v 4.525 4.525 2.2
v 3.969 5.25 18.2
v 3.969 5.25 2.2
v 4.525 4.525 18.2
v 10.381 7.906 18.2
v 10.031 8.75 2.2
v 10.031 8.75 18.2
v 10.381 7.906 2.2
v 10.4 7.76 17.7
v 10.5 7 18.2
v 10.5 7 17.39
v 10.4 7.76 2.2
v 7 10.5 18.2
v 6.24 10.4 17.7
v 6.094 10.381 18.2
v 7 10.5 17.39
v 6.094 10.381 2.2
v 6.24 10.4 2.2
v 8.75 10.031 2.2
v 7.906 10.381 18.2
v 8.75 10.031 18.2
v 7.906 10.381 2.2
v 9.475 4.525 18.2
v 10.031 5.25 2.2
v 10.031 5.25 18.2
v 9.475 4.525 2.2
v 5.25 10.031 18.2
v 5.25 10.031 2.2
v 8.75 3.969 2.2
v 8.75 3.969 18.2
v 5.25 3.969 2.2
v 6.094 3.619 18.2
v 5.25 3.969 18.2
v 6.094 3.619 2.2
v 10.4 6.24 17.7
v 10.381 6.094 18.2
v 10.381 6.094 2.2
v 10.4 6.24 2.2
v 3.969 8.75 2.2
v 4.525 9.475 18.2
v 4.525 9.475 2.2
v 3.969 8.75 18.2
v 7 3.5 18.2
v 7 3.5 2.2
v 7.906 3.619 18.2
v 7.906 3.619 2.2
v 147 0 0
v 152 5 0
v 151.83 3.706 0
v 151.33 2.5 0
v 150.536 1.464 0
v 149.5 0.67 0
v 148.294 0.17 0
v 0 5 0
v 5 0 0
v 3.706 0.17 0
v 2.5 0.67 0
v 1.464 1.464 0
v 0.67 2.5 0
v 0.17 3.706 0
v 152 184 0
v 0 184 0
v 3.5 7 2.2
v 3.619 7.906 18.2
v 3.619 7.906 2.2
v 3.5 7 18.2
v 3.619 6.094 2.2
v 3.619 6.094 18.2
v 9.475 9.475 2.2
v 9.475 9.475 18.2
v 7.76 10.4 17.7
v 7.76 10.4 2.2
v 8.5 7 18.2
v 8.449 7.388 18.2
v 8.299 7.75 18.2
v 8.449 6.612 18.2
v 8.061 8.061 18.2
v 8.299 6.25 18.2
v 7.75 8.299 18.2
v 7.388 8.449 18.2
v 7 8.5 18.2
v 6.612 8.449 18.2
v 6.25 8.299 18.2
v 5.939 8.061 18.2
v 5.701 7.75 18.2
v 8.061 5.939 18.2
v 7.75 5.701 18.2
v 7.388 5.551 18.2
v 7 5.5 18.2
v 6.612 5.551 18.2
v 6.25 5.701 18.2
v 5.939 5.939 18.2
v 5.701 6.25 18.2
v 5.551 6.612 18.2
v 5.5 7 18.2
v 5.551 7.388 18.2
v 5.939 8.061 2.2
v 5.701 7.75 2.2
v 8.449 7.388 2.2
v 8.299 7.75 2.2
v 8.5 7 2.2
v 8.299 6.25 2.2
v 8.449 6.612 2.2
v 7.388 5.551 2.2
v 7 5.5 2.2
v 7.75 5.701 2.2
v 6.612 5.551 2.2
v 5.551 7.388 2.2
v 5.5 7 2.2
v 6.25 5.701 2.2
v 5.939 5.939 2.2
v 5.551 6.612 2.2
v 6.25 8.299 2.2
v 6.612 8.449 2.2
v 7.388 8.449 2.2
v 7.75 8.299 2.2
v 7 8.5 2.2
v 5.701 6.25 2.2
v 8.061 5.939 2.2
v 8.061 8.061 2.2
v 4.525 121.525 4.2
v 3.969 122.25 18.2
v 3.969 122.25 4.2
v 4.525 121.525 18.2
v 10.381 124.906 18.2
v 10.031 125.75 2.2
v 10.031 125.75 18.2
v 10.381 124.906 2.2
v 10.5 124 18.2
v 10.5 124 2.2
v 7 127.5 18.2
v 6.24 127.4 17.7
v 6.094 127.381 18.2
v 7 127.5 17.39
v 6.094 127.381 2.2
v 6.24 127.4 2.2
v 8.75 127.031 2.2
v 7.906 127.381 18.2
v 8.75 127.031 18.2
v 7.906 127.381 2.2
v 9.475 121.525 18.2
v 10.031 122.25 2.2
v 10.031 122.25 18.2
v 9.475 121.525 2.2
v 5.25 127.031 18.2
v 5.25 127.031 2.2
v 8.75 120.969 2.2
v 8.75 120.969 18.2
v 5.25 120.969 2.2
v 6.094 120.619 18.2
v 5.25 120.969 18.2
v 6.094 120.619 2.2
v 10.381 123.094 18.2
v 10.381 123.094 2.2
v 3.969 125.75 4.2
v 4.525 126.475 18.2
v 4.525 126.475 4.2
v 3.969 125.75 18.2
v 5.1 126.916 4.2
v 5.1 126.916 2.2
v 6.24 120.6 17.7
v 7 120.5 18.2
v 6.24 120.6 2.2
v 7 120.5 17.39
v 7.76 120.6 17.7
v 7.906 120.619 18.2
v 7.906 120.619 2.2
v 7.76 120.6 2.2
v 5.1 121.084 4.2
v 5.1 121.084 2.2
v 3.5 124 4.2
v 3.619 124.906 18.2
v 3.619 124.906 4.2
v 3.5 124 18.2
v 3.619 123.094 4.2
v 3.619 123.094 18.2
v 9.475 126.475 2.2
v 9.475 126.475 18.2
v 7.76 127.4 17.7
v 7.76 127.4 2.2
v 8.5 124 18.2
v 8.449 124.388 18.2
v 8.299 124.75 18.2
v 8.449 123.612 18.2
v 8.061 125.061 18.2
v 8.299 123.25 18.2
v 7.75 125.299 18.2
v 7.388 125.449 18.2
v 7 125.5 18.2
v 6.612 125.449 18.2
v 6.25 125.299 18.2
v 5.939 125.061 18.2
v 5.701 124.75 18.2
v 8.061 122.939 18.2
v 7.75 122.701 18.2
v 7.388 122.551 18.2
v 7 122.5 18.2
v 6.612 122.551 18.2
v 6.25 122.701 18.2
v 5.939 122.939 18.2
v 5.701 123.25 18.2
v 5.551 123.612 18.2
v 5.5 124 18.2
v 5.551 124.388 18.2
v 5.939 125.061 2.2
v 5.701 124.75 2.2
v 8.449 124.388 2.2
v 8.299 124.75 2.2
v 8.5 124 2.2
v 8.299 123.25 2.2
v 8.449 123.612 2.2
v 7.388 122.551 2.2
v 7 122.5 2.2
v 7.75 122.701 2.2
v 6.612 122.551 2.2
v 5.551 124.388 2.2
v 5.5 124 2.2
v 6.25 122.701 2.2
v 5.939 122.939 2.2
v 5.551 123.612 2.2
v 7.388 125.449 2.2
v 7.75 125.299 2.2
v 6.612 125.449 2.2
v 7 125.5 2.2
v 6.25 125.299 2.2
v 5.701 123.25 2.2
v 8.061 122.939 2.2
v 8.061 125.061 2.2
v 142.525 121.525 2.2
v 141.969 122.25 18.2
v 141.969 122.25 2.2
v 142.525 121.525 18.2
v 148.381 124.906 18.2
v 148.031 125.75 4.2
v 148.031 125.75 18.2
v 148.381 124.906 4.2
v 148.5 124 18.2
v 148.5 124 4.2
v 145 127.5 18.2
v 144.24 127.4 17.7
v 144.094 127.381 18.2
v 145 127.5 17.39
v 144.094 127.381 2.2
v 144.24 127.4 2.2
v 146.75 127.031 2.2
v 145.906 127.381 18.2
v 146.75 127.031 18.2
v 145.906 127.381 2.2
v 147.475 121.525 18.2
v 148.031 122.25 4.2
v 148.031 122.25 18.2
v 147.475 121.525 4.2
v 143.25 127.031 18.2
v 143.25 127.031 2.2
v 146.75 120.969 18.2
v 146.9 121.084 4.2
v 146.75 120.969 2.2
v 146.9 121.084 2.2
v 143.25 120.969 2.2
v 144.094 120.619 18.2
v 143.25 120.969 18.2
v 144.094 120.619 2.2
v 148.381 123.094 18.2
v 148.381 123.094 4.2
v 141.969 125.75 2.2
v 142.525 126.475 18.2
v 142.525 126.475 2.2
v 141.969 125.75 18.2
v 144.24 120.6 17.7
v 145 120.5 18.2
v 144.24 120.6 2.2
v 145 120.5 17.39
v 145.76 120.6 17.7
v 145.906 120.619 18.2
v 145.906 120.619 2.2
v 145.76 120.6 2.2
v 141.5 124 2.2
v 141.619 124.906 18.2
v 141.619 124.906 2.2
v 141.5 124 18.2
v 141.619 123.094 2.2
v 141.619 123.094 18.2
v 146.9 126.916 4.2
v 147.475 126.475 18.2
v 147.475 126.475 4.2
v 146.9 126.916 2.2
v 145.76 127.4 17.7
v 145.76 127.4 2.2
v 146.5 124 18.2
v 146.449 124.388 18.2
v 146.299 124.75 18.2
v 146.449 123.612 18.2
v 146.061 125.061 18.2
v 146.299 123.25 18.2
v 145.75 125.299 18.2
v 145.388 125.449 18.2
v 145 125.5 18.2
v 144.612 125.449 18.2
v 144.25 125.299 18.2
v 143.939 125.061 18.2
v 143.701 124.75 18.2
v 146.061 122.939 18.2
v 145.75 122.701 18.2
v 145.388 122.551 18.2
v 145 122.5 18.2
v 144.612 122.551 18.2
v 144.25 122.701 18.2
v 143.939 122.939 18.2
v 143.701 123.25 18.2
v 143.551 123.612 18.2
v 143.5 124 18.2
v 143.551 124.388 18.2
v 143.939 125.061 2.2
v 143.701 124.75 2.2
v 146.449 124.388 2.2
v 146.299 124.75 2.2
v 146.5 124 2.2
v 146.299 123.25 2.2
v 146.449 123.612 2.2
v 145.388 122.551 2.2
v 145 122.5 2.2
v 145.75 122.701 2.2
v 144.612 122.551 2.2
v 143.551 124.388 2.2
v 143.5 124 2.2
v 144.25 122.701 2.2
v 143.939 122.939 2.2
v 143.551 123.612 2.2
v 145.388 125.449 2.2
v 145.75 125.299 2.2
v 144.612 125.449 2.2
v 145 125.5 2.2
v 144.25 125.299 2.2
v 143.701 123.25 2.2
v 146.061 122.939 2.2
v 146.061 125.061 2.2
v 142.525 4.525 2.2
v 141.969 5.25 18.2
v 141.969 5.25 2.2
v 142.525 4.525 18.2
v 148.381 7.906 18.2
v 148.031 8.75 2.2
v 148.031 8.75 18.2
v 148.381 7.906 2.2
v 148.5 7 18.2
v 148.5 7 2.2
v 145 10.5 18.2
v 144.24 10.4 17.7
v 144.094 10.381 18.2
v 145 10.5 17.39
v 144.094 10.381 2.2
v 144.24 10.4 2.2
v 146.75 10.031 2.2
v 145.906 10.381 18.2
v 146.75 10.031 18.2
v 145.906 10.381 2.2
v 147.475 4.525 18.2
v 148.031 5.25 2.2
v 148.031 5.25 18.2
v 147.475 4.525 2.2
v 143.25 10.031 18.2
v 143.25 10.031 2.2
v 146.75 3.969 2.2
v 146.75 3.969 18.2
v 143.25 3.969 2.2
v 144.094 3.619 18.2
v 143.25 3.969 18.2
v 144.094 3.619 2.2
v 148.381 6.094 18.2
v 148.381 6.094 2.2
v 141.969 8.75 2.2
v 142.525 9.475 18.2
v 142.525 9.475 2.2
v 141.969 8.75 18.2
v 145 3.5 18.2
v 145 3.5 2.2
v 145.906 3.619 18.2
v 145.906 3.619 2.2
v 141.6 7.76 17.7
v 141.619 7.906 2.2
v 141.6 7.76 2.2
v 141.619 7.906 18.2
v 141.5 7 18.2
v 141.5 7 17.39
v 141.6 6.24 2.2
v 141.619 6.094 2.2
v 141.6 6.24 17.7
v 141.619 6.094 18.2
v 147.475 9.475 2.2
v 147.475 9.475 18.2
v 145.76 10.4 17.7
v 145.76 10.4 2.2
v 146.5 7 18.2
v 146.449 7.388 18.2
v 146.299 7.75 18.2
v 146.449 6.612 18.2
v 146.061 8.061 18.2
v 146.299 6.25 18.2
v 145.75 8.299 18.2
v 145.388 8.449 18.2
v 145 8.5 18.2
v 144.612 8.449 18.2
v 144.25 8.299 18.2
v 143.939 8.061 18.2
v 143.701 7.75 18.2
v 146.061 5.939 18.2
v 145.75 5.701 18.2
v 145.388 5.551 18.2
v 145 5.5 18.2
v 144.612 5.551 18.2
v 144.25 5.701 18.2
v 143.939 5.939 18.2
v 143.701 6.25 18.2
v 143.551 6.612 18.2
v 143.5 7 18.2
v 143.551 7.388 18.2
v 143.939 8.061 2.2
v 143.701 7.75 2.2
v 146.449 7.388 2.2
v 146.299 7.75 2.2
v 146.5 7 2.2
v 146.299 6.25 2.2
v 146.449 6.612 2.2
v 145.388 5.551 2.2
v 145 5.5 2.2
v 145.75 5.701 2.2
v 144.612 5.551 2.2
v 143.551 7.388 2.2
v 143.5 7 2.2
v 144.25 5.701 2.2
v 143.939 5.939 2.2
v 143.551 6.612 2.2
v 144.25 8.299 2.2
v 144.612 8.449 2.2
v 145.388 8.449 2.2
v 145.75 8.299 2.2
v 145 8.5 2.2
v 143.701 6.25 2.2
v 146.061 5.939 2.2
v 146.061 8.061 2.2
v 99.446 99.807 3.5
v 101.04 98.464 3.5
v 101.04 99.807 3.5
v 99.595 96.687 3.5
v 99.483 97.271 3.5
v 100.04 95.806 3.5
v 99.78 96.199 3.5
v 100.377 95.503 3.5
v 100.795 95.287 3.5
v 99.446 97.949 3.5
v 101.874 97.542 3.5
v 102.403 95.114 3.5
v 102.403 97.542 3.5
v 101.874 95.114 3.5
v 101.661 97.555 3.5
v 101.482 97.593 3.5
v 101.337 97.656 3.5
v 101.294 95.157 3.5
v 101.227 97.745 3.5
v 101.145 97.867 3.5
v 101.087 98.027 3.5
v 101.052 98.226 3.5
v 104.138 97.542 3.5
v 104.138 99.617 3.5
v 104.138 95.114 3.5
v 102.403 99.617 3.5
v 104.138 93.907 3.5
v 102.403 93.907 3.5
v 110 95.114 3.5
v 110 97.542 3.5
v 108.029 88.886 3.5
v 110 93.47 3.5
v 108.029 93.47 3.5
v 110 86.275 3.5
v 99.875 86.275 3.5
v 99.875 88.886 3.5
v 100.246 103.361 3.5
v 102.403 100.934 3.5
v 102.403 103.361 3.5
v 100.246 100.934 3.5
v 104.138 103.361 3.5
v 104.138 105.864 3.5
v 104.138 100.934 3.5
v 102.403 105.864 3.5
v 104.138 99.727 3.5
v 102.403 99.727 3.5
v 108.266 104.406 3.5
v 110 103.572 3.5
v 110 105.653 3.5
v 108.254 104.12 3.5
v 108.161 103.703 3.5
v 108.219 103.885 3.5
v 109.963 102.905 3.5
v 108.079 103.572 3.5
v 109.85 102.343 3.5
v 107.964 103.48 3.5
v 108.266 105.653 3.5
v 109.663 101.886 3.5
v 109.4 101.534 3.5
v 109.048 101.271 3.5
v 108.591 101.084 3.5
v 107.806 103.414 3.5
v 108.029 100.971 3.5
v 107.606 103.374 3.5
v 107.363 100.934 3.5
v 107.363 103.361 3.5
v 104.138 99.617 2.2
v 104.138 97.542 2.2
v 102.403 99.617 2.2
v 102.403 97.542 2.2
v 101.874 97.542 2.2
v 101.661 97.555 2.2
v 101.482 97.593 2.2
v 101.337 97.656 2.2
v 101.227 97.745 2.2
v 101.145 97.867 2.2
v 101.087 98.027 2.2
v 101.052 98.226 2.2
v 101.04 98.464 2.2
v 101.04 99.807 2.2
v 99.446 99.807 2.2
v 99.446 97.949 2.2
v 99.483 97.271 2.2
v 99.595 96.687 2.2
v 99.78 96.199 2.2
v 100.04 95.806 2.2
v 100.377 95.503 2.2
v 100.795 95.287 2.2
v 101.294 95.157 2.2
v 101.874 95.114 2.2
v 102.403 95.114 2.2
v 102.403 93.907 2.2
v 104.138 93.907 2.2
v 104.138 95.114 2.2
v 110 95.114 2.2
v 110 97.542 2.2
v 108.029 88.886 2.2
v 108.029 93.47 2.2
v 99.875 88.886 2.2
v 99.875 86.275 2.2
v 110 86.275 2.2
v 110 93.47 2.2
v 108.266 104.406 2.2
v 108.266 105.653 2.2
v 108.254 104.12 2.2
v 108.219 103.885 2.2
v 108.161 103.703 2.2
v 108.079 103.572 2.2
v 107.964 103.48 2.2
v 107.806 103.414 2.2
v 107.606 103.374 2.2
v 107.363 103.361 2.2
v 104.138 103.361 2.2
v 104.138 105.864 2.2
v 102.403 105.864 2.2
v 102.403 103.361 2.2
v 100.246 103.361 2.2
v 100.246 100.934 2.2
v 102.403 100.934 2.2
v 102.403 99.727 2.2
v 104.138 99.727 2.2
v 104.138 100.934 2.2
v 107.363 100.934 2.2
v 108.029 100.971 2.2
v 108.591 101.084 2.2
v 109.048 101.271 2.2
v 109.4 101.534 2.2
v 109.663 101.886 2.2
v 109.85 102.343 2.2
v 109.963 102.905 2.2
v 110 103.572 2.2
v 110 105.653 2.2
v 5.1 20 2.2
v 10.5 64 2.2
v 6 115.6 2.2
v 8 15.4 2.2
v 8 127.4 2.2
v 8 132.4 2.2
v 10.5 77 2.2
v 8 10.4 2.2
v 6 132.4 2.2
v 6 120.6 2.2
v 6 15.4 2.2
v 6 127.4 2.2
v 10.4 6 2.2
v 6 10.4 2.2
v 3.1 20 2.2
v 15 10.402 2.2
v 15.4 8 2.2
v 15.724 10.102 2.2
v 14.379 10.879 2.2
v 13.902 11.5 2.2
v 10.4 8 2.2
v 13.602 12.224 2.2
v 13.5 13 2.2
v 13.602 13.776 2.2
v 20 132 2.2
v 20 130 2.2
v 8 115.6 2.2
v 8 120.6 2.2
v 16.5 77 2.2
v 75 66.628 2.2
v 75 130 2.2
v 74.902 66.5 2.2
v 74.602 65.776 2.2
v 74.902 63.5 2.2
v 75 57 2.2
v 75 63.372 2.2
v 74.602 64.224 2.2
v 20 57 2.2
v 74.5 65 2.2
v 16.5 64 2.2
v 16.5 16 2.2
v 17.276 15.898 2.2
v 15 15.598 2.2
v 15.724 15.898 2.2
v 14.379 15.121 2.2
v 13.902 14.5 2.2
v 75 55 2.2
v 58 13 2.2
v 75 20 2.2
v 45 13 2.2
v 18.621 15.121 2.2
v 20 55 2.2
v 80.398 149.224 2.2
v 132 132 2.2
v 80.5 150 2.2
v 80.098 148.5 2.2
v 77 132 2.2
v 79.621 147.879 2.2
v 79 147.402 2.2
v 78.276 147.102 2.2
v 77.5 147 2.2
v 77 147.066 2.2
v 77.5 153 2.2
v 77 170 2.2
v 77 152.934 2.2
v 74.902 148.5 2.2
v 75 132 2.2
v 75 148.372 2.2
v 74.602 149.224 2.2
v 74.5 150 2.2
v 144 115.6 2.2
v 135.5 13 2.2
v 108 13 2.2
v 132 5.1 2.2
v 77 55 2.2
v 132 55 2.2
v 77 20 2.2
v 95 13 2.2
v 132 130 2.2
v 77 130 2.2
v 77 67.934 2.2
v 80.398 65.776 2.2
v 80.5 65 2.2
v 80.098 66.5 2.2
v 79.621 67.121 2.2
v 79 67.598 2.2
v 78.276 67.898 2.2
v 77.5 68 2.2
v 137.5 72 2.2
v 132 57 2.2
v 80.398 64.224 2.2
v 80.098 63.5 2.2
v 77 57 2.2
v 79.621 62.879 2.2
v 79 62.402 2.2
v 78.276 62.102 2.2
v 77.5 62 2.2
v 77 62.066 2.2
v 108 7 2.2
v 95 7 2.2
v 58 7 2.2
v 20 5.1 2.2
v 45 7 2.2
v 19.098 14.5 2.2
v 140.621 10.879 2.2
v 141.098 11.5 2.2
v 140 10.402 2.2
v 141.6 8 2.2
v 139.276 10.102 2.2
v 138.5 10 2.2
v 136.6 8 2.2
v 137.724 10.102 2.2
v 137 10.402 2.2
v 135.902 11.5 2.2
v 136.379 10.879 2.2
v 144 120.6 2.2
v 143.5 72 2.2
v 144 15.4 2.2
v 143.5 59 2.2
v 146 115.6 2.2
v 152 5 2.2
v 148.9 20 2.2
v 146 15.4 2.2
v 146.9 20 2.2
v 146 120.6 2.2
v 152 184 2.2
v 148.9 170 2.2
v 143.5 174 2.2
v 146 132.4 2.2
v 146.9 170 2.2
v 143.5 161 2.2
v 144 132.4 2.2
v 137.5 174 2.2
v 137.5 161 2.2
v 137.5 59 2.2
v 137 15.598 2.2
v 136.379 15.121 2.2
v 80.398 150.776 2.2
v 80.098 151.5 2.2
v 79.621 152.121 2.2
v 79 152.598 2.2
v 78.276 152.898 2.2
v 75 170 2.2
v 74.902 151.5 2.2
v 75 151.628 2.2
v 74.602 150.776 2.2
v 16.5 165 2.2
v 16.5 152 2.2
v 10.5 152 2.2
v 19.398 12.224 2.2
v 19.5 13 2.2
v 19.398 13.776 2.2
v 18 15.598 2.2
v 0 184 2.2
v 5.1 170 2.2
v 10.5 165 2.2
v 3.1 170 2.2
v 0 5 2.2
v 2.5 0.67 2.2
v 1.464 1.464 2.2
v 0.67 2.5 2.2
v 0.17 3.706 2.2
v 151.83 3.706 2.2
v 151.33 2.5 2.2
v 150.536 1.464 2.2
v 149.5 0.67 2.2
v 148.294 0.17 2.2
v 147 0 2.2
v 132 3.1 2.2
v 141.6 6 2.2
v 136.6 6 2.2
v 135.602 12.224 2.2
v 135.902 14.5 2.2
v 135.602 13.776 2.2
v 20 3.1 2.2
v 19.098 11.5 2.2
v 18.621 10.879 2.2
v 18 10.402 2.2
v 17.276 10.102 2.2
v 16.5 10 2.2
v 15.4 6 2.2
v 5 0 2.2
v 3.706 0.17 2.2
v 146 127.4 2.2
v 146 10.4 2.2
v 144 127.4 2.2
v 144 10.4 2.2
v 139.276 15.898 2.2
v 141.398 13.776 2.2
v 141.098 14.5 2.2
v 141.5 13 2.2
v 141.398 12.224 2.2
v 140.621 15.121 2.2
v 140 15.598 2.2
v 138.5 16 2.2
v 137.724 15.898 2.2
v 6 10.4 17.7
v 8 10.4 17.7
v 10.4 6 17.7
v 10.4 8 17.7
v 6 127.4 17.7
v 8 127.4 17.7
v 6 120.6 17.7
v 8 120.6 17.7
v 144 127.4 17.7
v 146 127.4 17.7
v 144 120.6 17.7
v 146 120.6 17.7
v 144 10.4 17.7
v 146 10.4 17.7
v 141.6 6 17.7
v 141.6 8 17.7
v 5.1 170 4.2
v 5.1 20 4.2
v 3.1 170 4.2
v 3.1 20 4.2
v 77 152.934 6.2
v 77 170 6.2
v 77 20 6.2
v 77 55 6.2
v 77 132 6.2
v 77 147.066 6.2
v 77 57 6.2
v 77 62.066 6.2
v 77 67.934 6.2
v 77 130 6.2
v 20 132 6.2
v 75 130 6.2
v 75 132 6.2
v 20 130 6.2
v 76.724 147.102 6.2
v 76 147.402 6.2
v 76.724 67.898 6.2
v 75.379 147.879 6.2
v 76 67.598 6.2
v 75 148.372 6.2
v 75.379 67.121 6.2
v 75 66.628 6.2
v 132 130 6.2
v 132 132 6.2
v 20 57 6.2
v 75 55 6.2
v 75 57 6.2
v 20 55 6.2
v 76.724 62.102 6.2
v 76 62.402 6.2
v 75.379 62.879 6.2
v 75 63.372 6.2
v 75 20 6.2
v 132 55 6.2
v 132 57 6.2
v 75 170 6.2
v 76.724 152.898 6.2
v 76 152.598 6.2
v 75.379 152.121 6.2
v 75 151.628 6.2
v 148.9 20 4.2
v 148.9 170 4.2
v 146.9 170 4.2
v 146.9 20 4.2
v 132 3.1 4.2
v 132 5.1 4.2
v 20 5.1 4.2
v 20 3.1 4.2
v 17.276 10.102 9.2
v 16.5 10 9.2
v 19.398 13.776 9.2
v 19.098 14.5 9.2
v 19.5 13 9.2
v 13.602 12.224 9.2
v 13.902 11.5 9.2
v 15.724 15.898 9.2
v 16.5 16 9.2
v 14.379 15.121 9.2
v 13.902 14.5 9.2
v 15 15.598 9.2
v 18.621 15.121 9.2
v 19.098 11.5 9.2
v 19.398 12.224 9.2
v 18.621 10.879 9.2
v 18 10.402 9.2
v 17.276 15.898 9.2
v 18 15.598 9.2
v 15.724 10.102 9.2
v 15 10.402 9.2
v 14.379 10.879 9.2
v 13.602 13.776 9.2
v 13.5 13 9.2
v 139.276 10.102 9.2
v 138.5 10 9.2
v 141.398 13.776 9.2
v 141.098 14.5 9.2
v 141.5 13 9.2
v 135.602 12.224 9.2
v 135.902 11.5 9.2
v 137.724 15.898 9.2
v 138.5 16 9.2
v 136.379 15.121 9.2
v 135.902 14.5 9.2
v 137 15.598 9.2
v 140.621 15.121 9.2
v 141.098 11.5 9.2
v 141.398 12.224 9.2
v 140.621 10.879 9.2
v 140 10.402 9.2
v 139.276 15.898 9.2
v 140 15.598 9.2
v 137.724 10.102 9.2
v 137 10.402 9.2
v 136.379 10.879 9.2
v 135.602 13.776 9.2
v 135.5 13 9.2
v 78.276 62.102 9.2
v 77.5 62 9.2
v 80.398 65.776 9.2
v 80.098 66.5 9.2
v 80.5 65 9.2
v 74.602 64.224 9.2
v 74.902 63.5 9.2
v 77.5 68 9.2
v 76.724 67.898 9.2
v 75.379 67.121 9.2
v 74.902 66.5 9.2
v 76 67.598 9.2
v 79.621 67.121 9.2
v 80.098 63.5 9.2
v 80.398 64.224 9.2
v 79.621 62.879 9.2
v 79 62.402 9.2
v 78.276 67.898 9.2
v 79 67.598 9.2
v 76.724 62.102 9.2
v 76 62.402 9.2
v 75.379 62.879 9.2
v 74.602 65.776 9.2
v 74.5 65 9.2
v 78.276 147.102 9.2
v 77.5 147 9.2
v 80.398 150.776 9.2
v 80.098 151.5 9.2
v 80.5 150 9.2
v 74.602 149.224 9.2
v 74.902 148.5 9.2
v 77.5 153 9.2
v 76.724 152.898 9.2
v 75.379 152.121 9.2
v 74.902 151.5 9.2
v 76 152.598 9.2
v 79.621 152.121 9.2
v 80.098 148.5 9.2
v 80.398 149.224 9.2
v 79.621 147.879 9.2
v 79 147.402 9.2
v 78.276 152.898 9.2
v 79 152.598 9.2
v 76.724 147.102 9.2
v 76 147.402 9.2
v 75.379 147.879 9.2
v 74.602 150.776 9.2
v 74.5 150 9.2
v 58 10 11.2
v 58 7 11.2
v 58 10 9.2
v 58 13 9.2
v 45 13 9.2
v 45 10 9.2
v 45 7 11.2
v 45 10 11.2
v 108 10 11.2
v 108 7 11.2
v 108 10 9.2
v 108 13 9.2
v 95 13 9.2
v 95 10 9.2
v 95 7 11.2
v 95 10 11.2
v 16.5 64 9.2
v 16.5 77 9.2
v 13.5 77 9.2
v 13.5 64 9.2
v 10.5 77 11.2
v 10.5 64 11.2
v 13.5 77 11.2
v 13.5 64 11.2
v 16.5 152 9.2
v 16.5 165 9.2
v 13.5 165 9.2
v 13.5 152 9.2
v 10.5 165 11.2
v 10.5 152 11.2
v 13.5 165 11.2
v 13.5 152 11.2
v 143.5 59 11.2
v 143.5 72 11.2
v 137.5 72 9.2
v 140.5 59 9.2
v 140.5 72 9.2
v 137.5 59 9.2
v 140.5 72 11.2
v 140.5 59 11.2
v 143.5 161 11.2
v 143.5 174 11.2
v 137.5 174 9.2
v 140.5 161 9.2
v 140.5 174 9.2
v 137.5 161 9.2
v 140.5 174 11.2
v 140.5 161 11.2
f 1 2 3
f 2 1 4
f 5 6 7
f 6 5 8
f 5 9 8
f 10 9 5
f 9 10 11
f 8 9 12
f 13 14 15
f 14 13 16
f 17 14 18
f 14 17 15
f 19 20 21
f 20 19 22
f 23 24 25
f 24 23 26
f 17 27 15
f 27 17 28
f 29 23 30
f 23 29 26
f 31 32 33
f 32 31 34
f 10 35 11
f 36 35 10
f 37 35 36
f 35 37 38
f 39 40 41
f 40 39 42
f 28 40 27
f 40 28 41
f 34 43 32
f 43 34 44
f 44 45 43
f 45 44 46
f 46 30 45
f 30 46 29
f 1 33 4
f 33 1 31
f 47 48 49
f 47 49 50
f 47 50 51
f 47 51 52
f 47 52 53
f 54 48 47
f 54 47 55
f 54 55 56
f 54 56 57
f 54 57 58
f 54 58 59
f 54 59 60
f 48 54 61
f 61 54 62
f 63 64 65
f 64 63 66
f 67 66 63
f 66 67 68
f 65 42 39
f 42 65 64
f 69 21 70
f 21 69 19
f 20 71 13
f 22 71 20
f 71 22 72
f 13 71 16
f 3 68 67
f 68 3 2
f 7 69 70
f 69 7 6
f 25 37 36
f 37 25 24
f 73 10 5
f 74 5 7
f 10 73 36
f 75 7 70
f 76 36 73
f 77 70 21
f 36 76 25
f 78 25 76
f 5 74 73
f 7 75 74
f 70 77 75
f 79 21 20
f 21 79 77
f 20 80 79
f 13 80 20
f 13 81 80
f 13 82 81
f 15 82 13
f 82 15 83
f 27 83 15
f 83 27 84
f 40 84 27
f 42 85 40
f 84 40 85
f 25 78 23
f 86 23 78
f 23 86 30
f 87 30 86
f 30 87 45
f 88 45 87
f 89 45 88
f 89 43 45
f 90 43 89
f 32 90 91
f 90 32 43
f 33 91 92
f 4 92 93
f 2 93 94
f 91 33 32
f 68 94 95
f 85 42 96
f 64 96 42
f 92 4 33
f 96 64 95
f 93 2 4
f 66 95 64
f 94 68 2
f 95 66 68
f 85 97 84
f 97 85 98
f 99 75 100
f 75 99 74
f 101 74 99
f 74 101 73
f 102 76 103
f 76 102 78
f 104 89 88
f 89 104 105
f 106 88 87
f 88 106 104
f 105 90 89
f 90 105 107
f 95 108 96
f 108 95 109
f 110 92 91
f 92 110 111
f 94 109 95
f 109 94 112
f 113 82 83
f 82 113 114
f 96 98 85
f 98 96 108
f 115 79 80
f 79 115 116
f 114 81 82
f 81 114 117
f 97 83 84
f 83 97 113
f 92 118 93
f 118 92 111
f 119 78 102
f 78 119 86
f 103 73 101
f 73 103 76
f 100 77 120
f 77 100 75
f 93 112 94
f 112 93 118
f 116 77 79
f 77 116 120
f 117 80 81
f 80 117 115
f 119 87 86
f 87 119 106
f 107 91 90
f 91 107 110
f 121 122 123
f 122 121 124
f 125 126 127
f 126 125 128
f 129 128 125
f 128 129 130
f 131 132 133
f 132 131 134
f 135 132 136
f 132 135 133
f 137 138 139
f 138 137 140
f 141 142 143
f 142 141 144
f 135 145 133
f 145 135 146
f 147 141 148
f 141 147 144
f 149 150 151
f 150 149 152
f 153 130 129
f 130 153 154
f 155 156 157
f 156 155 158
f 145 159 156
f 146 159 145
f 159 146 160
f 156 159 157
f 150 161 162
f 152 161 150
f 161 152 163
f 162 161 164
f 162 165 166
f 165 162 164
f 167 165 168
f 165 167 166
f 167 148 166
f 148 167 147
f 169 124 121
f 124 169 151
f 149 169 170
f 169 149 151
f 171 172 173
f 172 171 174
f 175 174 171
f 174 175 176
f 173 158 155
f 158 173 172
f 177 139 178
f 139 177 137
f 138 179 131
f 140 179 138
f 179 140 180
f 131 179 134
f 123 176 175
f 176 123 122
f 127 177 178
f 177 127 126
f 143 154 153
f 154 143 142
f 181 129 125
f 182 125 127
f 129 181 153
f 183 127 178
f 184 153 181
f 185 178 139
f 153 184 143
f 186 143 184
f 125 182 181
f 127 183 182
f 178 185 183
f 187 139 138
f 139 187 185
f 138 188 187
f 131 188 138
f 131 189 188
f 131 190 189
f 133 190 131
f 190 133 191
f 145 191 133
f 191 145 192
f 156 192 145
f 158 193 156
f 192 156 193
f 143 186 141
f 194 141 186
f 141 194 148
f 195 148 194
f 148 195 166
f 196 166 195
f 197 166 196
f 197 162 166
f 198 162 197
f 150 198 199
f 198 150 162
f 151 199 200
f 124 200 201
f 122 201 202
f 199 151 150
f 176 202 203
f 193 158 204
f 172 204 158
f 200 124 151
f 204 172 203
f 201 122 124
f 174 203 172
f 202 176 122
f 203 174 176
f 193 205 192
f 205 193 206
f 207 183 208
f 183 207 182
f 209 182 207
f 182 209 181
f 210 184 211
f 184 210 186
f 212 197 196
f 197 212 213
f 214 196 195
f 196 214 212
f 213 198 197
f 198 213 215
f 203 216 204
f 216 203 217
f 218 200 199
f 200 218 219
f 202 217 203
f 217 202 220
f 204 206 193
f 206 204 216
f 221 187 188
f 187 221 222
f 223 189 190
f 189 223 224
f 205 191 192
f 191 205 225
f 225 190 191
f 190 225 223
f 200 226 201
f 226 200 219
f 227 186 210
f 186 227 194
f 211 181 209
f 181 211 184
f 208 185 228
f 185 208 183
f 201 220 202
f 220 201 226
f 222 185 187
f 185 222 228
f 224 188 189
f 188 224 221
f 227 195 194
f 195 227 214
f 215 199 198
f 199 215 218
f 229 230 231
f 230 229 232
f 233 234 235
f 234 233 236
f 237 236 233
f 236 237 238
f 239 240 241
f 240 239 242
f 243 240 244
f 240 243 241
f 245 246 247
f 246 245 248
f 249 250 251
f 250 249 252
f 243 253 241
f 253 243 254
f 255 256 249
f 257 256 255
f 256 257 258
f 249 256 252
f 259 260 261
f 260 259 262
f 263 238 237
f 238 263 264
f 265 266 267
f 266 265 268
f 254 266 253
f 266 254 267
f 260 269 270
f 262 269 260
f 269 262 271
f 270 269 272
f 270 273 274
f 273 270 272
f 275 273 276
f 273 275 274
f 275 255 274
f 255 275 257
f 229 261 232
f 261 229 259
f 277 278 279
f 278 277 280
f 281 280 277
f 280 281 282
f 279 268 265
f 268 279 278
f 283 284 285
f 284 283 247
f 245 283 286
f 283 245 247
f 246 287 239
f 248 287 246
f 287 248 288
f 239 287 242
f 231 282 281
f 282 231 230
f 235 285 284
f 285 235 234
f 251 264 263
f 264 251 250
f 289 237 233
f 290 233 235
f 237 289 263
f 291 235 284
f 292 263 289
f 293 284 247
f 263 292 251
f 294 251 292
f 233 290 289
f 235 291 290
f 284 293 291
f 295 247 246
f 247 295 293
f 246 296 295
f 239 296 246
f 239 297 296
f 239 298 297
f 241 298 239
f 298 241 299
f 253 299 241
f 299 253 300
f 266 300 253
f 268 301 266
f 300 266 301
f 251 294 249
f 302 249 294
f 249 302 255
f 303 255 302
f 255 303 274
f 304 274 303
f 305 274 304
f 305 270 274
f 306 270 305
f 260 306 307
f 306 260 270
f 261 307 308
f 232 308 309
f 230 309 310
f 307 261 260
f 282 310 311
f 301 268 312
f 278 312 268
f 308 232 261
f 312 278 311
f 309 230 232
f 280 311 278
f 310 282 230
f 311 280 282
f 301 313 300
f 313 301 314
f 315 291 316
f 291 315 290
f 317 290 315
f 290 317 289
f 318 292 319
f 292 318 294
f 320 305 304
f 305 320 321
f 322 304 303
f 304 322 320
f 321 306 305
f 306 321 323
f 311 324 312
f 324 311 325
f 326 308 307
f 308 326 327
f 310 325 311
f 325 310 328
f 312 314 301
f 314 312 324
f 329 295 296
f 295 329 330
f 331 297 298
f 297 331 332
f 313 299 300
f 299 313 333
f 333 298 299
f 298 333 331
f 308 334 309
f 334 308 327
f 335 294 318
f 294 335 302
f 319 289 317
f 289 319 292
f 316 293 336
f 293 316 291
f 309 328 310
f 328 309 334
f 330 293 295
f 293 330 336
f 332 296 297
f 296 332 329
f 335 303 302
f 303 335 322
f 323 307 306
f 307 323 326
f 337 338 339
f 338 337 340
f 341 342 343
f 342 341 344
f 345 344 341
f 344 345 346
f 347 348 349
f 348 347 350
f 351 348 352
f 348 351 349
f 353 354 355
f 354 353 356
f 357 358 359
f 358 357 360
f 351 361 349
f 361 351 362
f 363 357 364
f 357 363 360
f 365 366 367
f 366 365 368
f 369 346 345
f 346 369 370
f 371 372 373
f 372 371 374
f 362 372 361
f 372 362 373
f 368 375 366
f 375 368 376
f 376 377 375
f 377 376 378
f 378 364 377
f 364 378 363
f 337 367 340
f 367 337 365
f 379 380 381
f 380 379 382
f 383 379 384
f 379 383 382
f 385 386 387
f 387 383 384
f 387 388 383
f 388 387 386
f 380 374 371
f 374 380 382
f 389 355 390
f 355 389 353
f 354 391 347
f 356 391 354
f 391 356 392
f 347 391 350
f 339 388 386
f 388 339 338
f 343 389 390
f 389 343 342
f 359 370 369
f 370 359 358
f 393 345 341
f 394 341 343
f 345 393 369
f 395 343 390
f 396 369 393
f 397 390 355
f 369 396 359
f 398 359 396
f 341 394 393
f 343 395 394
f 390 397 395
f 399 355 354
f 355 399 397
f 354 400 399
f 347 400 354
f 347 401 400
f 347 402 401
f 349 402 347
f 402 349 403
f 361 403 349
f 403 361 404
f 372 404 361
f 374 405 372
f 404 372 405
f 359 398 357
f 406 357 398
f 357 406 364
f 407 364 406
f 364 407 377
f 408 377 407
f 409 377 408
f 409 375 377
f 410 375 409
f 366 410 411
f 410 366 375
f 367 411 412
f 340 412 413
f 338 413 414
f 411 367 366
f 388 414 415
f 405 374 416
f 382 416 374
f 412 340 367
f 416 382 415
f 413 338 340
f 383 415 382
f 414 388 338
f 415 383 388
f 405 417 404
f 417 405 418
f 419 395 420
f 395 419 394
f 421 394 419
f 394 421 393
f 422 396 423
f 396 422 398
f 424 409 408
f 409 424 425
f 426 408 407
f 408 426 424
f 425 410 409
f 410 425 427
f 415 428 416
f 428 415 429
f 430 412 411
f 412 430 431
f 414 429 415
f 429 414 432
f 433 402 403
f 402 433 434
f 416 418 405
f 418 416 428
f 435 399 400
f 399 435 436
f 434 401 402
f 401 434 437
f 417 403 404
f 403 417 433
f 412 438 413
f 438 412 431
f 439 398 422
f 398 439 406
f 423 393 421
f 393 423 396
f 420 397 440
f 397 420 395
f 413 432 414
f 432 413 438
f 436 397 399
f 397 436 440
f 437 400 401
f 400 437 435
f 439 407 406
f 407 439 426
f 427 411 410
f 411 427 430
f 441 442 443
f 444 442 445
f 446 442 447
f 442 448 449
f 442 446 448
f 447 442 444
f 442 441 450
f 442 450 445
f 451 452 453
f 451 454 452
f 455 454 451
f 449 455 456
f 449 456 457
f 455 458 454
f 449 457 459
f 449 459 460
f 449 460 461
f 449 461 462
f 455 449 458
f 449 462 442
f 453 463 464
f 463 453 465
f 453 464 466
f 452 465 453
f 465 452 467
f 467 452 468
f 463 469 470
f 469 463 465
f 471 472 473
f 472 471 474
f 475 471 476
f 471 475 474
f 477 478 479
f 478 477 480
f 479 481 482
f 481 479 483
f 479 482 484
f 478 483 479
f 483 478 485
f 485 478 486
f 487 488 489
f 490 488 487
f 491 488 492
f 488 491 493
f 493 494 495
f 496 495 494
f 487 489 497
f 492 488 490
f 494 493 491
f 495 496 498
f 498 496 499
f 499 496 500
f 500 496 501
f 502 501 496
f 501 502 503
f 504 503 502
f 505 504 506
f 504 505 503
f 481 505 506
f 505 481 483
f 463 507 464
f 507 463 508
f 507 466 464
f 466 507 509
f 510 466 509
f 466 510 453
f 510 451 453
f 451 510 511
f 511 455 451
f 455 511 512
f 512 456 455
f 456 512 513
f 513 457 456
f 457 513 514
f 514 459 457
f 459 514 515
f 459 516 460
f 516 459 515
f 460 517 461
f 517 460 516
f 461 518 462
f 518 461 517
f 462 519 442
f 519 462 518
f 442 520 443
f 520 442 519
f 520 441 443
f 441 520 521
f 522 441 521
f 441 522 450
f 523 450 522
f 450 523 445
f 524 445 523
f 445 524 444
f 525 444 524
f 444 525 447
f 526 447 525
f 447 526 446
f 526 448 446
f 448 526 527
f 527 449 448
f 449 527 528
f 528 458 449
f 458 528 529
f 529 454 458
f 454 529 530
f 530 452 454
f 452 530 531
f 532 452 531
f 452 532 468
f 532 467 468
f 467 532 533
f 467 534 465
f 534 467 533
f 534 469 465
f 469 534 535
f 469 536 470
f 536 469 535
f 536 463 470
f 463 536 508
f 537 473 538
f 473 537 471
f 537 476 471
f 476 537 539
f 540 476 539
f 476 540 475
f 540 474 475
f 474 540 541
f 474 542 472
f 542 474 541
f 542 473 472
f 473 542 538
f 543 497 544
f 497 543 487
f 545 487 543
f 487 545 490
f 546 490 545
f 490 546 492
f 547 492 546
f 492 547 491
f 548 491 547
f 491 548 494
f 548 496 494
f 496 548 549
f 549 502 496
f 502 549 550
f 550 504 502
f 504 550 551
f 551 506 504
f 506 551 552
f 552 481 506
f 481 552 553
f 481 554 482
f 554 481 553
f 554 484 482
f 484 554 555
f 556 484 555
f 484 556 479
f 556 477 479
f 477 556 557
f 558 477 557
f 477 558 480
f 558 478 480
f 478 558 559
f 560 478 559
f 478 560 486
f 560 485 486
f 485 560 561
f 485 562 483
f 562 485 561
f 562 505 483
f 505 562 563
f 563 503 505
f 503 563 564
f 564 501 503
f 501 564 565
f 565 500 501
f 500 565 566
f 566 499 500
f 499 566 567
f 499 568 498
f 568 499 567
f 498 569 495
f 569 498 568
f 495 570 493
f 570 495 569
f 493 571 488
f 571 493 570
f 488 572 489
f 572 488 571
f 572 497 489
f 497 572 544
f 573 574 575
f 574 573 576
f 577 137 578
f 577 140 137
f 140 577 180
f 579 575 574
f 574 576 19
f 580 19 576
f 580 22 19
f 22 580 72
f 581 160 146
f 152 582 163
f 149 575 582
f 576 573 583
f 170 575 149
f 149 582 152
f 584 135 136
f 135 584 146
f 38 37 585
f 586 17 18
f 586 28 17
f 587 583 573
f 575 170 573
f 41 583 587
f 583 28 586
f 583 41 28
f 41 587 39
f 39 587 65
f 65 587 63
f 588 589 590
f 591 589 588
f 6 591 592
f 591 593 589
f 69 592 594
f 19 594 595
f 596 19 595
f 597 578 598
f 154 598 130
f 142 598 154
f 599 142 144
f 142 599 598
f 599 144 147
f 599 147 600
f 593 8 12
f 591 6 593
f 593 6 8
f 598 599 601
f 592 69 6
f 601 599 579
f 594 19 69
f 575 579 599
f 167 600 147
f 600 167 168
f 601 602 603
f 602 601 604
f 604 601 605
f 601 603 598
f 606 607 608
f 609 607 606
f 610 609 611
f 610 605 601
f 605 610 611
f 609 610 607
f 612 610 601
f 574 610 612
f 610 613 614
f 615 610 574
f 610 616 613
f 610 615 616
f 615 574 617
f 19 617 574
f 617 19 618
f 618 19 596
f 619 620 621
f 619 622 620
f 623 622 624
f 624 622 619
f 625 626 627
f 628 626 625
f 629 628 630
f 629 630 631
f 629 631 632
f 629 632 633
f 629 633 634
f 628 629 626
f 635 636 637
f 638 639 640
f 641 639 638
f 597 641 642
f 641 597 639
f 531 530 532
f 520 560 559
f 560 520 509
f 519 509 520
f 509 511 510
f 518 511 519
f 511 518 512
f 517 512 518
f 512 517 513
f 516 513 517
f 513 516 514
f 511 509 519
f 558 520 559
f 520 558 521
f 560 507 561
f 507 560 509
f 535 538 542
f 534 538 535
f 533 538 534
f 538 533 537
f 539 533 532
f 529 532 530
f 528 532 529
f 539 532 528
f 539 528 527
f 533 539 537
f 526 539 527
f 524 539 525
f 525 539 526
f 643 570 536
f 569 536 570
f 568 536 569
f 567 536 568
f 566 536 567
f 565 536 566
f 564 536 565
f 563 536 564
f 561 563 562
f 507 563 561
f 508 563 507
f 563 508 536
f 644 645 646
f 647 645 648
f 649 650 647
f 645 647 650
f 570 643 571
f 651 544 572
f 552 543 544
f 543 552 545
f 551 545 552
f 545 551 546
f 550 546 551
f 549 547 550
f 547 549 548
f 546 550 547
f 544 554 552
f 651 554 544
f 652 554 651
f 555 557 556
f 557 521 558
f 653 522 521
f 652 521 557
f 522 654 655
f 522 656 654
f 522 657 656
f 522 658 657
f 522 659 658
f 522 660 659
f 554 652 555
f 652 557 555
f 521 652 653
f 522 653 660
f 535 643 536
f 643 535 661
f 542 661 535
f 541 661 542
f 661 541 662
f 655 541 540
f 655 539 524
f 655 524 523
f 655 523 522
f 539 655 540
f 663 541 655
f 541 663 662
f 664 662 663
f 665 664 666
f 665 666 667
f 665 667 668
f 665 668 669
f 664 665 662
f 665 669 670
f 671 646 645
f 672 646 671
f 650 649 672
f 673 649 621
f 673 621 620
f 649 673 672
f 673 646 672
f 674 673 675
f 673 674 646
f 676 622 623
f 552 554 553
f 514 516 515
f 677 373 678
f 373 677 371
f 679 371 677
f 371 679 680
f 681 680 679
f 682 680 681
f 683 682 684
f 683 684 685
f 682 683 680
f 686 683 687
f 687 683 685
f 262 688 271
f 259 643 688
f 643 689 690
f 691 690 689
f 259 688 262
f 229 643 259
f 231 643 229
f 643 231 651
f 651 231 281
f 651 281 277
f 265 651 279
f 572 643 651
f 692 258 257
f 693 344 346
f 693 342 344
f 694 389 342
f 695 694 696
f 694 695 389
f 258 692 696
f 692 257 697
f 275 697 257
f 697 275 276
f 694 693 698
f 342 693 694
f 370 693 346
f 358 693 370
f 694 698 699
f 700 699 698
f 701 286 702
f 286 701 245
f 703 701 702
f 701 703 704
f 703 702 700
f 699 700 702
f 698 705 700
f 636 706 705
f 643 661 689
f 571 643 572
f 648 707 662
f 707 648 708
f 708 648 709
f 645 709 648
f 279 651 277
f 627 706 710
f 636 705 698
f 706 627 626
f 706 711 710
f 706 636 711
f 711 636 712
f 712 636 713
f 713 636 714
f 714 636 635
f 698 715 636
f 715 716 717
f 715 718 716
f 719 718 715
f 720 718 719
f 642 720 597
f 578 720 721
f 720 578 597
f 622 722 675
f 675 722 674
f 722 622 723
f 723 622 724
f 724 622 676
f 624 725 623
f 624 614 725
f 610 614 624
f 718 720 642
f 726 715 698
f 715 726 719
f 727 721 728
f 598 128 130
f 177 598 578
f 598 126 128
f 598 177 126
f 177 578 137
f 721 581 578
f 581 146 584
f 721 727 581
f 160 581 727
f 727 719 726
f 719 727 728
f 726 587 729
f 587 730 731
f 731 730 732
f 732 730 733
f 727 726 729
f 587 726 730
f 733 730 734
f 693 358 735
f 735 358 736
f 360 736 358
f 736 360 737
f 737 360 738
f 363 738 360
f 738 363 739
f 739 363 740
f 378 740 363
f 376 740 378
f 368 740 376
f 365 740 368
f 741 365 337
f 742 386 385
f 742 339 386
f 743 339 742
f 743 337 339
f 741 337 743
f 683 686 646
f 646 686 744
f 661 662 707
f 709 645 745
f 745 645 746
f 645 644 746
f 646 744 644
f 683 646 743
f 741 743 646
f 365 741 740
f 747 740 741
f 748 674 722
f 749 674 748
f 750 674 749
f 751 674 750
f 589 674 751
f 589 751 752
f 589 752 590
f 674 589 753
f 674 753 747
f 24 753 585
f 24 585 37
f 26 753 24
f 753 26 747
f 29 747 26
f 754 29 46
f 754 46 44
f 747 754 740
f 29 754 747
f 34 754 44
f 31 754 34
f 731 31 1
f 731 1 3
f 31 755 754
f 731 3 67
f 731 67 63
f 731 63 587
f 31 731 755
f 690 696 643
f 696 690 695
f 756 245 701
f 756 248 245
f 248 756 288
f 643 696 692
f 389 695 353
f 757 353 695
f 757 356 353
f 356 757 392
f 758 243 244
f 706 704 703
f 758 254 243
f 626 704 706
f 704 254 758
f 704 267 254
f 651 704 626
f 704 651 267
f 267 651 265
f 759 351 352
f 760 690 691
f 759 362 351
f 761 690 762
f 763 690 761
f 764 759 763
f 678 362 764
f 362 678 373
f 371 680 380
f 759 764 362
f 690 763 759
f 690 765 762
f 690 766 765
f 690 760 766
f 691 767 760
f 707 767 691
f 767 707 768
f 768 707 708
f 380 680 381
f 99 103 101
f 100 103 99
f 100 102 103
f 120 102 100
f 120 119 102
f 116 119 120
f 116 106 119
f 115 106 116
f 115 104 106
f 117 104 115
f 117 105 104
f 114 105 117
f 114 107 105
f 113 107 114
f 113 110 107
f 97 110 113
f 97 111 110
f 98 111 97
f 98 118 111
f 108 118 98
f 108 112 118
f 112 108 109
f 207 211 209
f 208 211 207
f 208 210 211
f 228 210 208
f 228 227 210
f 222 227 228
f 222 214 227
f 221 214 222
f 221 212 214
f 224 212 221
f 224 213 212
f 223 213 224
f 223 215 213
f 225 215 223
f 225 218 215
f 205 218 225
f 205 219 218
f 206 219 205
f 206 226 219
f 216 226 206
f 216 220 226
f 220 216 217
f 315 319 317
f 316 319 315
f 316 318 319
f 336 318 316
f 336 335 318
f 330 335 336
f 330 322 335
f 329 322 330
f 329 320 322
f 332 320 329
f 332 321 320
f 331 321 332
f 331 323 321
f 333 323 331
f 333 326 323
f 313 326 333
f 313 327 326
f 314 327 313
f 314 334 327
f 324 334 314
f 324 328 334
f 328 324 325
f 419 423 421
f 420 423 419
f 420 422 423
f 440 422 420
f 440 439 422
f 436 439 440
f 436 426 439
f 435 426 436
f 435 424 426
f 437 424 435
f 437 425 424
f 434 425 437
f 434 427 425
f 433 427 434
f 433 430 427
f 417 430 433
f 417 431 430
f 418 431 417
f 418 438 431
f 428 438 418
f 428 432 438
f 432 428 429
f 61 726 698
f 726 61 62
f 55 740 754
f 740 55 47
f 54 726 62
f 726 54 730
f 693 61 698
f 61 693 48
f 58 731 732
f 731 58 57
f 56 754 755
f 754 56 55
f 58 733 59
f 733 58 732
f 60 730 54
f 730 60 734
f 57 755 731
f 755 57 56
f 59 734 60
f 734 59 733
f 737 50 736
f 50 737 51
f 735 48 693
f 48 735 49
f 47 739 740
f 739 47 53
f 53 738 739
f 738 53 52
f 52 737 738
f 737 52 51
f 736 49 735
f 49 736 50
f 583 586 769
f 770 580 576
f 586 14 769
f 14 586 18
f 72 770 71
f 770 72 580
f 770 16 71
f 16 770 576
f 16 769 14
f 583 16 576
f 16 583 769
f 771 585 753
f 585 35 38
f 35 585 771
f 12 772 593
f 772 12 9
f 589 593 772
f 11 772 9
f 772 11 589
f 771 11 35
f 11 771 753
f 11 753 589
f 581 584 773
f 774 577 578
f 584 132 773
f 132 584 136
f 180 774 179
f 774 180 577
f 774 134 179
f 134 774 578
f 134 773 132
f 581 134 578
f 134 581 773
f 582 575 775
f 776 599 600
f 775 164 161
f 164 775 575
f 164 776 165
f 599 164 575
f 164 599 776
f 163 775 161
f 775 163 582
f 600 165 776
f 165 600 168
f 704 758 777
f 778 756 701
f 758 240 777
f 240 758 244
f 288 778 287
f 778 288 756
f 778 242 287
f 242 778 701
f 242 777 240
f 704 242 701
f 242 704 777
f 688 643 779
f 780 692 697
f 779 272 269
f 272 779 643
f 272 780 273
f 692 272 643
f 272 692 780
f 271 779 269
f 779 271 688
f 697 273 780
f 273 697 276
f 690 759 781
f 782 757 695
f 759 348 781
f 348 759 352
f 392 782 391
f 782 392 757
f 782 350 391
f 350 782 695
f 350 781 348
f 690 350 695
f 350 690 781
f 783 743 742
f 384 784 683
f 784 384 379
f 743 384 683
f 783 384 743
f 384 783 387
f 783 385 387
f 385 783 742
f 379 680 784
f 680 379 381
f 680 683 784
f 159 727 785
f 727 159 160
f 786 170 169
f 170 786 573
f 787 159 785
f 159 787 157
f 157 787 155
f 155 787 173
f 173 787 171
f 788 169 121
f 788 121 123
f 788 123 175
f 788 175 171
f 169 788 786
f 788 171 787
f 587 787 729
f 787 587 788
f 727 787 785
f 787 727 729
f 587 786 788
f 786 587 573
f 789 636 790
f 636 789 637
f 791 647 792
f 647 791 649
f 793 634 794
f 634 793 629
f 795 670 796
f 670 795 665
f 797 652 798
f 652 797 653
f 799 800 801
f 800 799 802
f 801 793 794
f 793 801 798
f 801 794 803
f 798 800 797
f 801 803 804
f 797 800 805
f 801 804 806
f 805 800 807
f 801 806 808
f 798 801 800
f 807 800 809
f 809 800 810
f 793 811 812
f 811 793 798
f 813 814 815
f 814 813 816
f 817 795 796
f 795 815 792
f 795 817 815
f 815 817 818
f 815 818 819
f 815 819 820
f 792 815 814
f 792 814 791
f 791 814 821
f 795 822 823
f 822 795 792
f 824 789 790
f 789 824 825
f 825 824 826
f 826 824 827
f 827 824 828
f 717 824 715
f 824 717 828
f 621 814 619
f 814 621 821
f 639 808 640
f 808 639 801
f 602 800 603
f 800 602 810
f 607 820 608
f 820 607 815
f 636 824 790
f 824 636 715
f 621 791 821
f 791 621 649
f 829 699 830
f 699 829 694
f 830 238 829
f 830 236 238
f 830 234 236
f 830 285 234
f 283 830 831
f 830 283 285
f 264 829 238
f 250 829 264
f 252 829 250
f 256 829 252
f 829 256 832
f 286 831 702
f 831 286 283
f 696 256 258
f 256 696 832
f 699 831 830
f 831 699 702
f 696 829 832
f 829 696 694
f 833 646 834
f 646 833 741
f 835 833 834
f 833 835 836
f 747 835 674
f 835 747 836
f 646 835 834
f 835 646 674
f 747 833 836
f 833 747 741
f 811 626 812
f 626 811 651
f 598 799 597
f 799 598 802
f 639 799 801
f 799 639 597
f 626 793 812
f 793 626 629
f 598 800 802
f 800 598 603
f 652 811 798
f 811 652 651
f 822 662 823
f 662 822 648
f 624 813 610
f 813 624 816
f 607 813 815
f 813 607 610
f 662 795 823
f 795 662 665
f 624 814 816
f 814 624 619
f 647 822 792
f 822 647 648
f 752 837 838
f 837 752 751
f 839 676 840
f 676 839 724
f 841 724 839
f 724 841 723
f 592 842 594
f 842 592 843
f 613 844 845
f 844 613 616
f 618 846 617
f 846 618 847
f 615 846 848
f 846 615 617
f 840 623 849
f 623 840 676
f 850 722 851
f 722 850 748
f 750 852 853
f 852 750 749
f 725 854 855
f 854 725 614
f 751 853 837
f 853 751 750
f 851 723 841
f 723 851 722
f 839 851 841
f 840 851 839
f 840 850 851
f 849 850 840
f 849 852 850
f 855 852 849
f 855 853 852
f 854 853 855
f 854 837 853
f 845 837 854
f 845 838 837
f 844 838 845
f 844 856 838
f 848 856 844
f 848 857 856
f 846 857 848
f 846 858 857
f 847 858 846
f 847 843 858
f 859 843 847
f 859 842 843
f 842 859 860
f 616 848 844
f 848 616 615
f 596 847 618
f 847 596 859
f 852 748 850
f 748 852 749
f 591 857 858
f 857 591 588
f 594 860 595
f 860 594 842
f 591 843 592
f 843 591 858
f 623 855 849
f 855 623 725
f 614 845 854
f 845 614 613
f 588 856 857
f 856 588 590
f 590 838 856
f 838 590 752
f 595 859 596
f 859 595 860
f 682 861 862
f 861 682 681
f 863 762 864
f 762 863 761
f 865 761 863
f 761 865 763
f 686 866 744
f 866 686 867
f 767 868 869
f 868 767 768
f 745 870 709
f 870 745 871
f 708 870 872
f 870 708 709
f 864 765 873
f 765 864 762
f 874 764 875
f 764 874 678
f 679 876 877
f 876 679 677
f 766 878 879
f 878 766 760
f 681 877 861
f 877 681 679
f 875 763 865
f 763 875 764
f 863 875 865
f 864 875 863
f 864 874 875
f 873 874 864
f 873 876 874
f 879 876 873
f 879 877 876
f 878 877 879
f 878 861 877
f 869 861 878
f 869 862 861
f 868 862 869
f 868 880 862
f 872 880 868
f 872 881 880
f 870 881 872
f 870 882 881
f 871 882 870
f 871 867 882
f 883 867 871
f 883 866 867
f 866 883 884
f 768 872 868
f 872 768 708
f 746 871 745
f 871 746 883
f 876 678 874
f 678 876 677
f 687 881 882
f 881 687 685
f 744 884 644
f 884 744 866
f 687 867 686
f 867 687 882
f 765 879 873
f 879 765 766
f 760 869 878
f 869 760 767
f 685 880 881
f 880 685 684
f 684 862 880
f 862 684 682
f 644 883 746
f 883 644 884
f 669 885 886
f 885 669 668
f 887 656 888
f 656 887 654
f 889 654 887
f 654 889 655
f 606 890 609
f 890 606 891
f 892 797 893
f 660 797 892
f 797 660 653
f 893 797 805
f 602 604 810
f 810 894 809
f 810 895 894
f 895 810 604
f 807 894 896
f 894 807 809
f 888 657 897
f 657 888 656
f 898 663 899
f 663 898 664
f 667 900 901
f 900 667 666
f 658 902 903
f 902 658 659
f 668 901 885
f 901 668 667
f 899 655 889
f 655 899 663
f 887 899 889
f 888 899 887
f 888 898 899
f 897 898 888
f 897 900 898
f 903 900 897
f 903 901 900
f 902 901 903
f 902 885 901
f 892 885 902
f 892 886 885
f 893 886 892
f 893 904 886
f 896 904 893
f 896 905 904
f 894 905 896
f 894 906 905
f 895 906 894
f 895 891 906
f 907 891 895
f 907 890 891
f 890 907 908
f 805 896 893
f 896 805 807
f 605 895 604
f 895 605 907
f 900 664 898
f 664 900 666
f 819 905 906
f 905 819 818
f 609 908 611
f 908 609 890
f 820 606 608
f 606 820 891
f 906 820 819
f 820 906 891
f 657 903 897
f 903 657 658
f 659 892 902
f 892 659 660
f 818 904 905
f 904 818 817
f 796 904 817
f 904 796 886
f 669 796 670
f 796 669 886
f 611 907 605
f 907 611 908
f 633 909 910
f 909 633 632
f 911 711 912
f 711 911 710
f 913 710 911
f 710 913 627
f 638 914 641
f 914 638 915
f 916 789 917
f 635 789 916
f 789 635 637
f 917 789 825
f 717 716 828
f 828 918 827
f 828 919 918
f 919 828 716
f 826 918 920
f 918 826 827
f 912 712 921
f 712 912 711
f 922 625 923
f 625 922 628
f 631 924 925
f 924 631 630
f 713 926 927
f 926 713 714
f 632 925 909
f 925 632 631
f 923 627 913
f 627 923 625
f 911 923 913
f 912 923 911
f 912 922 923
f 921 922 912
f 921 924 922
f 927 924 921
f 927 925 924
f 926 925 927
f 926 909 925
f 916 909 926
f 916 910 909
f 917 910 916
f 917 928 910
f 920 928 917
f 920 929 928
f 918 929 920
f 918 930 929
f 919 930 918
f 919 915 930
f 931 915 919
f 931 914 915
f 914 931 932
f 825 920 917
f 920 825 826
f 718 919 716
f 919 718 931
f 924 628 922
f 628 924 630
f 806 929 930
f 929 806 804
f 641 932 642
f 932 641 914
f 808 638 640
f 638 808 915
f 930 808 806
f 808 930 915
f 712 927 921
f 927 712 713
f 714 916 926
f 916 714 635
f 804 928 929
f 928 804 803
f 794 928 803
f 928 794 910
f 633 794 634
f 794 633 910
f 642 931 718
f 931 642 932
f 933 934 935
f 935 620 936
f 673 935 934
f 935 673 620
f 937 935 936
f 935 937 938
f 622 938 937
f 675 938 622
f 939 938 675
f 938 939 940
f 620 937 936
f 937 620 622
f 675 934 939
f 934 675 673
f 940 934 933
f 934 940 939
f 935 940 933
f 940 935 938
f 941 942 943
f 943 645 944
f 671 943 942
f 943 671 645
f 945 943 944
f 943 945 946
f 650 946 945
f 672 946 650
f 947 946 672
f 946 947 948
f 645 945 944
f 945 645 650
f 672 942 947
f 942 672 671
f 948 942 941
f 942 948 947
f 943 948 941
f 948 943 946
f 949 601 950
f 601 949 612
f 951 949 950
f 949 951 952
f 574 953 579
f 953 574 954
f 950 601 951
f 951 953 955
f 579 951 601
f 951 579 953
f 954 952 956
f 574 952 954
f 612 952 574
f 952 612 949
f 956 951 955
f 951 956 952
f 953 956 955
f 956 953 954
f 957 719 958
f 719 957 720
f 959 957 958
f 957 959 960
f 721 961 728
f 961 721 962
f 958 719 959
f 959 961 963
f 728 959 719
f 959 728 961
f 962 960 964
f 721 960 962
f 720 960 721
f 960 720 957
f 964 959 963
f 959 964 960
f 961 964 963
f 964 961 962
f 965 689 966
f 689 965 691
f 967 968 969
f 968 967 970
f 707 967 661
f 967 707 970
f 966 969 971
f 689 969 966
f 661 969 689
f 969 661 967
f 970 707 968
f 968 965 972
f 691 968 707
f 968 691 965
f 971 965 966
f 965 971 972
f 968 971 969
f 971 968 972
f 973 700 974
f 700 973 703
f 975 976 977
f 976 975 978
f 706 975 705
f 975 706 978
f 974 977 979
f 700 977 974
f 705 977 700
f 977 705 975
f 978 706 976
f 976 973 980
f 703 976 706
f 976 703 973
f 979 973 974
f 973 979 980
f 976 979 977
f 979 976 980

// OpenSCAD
//TXT
translate([110,85,0])
rotate([0,0,90])
linear_extrude(3.5)
text("Lft",size=10,font="Open Sans:style=bold");
//BASE
$fn=24;
translate([5,5,0])
    cube([142,179,2.2]);
translate([5,0,0])
    cube([142,5,2.2]);
translate([0,5,0])
    cube([5,179,2.2]);
translate([147,5,0])
    cube([5,179,2.2]);    
translate([5,5,0])
    cylinder(h=2.2,r1=5,r2=5);
translate([147,5,0])
    cylinder(h=2.2,r1=5,r2=5);
//TOWER0
difference()
{
    translate([7,7,0])
        cylinder(h=18.2,r1=3.5,r2=3.5);
    translate([7,7,-1])
        cylinder(d=3,h=20);
}
//Trigon0Y
translate([6,10.4,2.2])
    {TrigonPoints = [
    [0,0,0],//0
    [0,5,0],//1
    [0,0,15.5],//2
    [2,0,0],//3
    [2,5,0],//4
    [2,0,15.5]];//5
    TrigonFaces = [
    [0,1,2],//outside
    [0,3,4,1],//bottom
    [0,2,5,3],//top    
    [2,1,4,5],//back
    [3,5,4]];//inside
polyhedron(TrigonPoints,TrigonFaces);}
//Trigon0Yright
translate([10.4,6,2.2])
    {TrigonPoints = [
    [0,0,0],//0
    [5,0,0],//1
    [0,0,15.5],//2
    [0,2,0],//3
    [5,2,0],//4
    [0,2,15.5]]; //5
    TrigonFaces = [
    [0,2,1],//outside
    [0,1,4,3],//bottom
    [0,3,5,2],//top
    [1,2,5,4],//back
    [3,4,5]];//inside
polyhedron(TrigonPoints,TrigonFaces);}//
//
//TOWER1
difference()
{
    translate([7,124,0])
        cylinder(h=18.2,r1=3.5,r2=3.5);
    translate([7,124,-1])
        cylinder(d=3,h=20);
}
//Trigon1Y
translate([6,127.4,2.2])
    {TrigonPoints = [
    [0,0,0],//0
    [0,5,0],//1
    [0,0,15.5],//2
    [2,0,0],//3
    [2,5,0],//4
    [2,0,15.5]];//5
    TrigonFaces = [
    [0,1,2],//outside
    [0,3,4,1],//bottom
    [0,2,5,3],//top
    [2,1,4,5],//back
    [3,5,4]];//inside
polyhedron(TrigonPoints,TrigonFaces);}
//Trigon1Yrev
translate([6,115.6,2.2])
    {TrigonPoints = [
    [0,0,0],//0
    [0,5,0],//1
    [0,5,15.5],//2
    [2,0,0],//3
    [2,5,0],//4
    [2,5,15.5]]; //5
    TrigonFaces = [
    [0,1,2],//outside
    [0,3,4,1],//bottom
    [0,2,5,3],//top
    [1,4,5,2],//back
    [3,5,4]];//inside
polyhedron(TrigonPoints,TrigonFaces);}
//
//TOWER2
difference()
{
    translate([145,124,0])
        cylinder(h=18.2,r1=3.5,r2=3.5);
    translate([145,124,-1])
        cylinder(d=3,h=20);
}
//Trigon2Y
translate([144,127.4,2.2])
    {TrigonPoints = [
    [0,0,0],//0
    [0,5,0],//1
    [0,0,15.5],//2
    [2,0,0],//3
    [2,5,0],//4
    [2,0,15.5]]; //5
    TrigonFaces = [
    [0,1,2],//outside
    [0,3,4,1],//bottom
    [0,2,5,3],//top
    [2,1,4,5],//back
    [3,5,4]];//inside
polyhedron(TrigonPoints,TrigonFaces);}
//Trigon2Yrev
translate([144,115.6,2.2])
    {TrigonPoints = [
    [0,0,0],//0
    [0,5,0],//1
    [0,5,15.5],//2
    [2,0,0],//3
    [2,5,0],//4
    [2,5,15.5]]; //5
    TrigonFaces = [
    [0,1,2],//outside
    [0,3,4,1],//bottom
    [0,2,5,3],//top
    [1,4,5,2],//back
    [3,5,4]];//inside
polyhedron(TrigonPoints,TrigonFaces);}
//
//TOWER3
difference()
{
    translate([145,7,0])
        cylinder(h=18.2,r1=3.5,r2=3.5);
    translate([145,7,-1])
        cylinder(d=3,h=20);
}
//Trigon3Y
translate([144,10.4,2.2])
    {TrigonPoints = [
    [0,0,0],//0
    [0,5,0],//1
    [0,0,15.5],//2
    [2,0,0],//3
    [2,5,0],//4
    [2,0,15.5]]; //5
    TrigonFaces = [
    [0,1,2],//outside
    [0,3,4,1],//bottom
    [0,2,5,3],//top
    [2,1,4,5],//back
    [3,5,4]];//inside
polyhedron(TrigonPoints,TrigonFaces);}
//Trigon3Yleft
translate([136.6,6,2.2])
    {TrigonPoints = [
    [0,0,0],//0
    [5,0,0],//1
    [5,0,15.5],//2
    [0,2,0],//3
    [5,2,0],//4
    [5,2,15.5]]; //5
    TrigonFaces = [
    [0,2,1],//outside
    [0,1,4,3],//bottom
    [0,3,5,2],//top
    [1,2,5,4],//back
    [3,4,5]];//inside
polyhedron(TrigonPoints,TrigonFaces);}
//Ribs
translate([3.1,20,2.2])
    cube([2,150,2]);
translate([75,20,2.2])
    cube([2,150,4]);
translate([146.9,20,2.2])
    cube([2,150,2]);
translate([20,3.1,2.2])
    cube([112,2,2]);
translate([20,130,2.2])
    cube([112,2,4]);
translate([20,55,2.2])
    cube([112,2,4]);
//Corner and Mid Supports
translate([16.5,13,2.2])
    cylinder(h=7,r1=3,r2=3);
translate([138.5,13,2.2])
    cylinder(h=7,r1=3,r2=3);
translate([77.5,65,2.2])
    cylinder(h=7,r1=3,r2=3);
translate([77.5,150,2.2])
    cylinder(h=7,r1=3,r2=3);
//PCB Side
translate([45,7,2.2])
    cube([13,6,7]);
translate([45,7,9.2])
    cube([13,3,2]);
translate([95,7,2.2])
    cube([13,6,7]);
translate([95,7,9.2])
    cube([13,3,2]);
//PCB Top Left
translate([10.5,64,2.2])
    cube([6,13,7]);
translate([10.5,64,9.2])
    cube([3,13,2]);
translate([10.5,152,2.2])
    cube([6,13,7]);
translate([10.5,152,9.2])
    cube([3,13,2]);
//PCB Bottom Left
translate([137.5,59,2.2])
    cube([6,13,7]);
translate([140.5,59,9.2])
    cube([3,13,2]);
translate([137.5,161,2.2])
    cube([6,13,7]);
translate([140.5,161,9.2])
    cube([3,13,2]);
